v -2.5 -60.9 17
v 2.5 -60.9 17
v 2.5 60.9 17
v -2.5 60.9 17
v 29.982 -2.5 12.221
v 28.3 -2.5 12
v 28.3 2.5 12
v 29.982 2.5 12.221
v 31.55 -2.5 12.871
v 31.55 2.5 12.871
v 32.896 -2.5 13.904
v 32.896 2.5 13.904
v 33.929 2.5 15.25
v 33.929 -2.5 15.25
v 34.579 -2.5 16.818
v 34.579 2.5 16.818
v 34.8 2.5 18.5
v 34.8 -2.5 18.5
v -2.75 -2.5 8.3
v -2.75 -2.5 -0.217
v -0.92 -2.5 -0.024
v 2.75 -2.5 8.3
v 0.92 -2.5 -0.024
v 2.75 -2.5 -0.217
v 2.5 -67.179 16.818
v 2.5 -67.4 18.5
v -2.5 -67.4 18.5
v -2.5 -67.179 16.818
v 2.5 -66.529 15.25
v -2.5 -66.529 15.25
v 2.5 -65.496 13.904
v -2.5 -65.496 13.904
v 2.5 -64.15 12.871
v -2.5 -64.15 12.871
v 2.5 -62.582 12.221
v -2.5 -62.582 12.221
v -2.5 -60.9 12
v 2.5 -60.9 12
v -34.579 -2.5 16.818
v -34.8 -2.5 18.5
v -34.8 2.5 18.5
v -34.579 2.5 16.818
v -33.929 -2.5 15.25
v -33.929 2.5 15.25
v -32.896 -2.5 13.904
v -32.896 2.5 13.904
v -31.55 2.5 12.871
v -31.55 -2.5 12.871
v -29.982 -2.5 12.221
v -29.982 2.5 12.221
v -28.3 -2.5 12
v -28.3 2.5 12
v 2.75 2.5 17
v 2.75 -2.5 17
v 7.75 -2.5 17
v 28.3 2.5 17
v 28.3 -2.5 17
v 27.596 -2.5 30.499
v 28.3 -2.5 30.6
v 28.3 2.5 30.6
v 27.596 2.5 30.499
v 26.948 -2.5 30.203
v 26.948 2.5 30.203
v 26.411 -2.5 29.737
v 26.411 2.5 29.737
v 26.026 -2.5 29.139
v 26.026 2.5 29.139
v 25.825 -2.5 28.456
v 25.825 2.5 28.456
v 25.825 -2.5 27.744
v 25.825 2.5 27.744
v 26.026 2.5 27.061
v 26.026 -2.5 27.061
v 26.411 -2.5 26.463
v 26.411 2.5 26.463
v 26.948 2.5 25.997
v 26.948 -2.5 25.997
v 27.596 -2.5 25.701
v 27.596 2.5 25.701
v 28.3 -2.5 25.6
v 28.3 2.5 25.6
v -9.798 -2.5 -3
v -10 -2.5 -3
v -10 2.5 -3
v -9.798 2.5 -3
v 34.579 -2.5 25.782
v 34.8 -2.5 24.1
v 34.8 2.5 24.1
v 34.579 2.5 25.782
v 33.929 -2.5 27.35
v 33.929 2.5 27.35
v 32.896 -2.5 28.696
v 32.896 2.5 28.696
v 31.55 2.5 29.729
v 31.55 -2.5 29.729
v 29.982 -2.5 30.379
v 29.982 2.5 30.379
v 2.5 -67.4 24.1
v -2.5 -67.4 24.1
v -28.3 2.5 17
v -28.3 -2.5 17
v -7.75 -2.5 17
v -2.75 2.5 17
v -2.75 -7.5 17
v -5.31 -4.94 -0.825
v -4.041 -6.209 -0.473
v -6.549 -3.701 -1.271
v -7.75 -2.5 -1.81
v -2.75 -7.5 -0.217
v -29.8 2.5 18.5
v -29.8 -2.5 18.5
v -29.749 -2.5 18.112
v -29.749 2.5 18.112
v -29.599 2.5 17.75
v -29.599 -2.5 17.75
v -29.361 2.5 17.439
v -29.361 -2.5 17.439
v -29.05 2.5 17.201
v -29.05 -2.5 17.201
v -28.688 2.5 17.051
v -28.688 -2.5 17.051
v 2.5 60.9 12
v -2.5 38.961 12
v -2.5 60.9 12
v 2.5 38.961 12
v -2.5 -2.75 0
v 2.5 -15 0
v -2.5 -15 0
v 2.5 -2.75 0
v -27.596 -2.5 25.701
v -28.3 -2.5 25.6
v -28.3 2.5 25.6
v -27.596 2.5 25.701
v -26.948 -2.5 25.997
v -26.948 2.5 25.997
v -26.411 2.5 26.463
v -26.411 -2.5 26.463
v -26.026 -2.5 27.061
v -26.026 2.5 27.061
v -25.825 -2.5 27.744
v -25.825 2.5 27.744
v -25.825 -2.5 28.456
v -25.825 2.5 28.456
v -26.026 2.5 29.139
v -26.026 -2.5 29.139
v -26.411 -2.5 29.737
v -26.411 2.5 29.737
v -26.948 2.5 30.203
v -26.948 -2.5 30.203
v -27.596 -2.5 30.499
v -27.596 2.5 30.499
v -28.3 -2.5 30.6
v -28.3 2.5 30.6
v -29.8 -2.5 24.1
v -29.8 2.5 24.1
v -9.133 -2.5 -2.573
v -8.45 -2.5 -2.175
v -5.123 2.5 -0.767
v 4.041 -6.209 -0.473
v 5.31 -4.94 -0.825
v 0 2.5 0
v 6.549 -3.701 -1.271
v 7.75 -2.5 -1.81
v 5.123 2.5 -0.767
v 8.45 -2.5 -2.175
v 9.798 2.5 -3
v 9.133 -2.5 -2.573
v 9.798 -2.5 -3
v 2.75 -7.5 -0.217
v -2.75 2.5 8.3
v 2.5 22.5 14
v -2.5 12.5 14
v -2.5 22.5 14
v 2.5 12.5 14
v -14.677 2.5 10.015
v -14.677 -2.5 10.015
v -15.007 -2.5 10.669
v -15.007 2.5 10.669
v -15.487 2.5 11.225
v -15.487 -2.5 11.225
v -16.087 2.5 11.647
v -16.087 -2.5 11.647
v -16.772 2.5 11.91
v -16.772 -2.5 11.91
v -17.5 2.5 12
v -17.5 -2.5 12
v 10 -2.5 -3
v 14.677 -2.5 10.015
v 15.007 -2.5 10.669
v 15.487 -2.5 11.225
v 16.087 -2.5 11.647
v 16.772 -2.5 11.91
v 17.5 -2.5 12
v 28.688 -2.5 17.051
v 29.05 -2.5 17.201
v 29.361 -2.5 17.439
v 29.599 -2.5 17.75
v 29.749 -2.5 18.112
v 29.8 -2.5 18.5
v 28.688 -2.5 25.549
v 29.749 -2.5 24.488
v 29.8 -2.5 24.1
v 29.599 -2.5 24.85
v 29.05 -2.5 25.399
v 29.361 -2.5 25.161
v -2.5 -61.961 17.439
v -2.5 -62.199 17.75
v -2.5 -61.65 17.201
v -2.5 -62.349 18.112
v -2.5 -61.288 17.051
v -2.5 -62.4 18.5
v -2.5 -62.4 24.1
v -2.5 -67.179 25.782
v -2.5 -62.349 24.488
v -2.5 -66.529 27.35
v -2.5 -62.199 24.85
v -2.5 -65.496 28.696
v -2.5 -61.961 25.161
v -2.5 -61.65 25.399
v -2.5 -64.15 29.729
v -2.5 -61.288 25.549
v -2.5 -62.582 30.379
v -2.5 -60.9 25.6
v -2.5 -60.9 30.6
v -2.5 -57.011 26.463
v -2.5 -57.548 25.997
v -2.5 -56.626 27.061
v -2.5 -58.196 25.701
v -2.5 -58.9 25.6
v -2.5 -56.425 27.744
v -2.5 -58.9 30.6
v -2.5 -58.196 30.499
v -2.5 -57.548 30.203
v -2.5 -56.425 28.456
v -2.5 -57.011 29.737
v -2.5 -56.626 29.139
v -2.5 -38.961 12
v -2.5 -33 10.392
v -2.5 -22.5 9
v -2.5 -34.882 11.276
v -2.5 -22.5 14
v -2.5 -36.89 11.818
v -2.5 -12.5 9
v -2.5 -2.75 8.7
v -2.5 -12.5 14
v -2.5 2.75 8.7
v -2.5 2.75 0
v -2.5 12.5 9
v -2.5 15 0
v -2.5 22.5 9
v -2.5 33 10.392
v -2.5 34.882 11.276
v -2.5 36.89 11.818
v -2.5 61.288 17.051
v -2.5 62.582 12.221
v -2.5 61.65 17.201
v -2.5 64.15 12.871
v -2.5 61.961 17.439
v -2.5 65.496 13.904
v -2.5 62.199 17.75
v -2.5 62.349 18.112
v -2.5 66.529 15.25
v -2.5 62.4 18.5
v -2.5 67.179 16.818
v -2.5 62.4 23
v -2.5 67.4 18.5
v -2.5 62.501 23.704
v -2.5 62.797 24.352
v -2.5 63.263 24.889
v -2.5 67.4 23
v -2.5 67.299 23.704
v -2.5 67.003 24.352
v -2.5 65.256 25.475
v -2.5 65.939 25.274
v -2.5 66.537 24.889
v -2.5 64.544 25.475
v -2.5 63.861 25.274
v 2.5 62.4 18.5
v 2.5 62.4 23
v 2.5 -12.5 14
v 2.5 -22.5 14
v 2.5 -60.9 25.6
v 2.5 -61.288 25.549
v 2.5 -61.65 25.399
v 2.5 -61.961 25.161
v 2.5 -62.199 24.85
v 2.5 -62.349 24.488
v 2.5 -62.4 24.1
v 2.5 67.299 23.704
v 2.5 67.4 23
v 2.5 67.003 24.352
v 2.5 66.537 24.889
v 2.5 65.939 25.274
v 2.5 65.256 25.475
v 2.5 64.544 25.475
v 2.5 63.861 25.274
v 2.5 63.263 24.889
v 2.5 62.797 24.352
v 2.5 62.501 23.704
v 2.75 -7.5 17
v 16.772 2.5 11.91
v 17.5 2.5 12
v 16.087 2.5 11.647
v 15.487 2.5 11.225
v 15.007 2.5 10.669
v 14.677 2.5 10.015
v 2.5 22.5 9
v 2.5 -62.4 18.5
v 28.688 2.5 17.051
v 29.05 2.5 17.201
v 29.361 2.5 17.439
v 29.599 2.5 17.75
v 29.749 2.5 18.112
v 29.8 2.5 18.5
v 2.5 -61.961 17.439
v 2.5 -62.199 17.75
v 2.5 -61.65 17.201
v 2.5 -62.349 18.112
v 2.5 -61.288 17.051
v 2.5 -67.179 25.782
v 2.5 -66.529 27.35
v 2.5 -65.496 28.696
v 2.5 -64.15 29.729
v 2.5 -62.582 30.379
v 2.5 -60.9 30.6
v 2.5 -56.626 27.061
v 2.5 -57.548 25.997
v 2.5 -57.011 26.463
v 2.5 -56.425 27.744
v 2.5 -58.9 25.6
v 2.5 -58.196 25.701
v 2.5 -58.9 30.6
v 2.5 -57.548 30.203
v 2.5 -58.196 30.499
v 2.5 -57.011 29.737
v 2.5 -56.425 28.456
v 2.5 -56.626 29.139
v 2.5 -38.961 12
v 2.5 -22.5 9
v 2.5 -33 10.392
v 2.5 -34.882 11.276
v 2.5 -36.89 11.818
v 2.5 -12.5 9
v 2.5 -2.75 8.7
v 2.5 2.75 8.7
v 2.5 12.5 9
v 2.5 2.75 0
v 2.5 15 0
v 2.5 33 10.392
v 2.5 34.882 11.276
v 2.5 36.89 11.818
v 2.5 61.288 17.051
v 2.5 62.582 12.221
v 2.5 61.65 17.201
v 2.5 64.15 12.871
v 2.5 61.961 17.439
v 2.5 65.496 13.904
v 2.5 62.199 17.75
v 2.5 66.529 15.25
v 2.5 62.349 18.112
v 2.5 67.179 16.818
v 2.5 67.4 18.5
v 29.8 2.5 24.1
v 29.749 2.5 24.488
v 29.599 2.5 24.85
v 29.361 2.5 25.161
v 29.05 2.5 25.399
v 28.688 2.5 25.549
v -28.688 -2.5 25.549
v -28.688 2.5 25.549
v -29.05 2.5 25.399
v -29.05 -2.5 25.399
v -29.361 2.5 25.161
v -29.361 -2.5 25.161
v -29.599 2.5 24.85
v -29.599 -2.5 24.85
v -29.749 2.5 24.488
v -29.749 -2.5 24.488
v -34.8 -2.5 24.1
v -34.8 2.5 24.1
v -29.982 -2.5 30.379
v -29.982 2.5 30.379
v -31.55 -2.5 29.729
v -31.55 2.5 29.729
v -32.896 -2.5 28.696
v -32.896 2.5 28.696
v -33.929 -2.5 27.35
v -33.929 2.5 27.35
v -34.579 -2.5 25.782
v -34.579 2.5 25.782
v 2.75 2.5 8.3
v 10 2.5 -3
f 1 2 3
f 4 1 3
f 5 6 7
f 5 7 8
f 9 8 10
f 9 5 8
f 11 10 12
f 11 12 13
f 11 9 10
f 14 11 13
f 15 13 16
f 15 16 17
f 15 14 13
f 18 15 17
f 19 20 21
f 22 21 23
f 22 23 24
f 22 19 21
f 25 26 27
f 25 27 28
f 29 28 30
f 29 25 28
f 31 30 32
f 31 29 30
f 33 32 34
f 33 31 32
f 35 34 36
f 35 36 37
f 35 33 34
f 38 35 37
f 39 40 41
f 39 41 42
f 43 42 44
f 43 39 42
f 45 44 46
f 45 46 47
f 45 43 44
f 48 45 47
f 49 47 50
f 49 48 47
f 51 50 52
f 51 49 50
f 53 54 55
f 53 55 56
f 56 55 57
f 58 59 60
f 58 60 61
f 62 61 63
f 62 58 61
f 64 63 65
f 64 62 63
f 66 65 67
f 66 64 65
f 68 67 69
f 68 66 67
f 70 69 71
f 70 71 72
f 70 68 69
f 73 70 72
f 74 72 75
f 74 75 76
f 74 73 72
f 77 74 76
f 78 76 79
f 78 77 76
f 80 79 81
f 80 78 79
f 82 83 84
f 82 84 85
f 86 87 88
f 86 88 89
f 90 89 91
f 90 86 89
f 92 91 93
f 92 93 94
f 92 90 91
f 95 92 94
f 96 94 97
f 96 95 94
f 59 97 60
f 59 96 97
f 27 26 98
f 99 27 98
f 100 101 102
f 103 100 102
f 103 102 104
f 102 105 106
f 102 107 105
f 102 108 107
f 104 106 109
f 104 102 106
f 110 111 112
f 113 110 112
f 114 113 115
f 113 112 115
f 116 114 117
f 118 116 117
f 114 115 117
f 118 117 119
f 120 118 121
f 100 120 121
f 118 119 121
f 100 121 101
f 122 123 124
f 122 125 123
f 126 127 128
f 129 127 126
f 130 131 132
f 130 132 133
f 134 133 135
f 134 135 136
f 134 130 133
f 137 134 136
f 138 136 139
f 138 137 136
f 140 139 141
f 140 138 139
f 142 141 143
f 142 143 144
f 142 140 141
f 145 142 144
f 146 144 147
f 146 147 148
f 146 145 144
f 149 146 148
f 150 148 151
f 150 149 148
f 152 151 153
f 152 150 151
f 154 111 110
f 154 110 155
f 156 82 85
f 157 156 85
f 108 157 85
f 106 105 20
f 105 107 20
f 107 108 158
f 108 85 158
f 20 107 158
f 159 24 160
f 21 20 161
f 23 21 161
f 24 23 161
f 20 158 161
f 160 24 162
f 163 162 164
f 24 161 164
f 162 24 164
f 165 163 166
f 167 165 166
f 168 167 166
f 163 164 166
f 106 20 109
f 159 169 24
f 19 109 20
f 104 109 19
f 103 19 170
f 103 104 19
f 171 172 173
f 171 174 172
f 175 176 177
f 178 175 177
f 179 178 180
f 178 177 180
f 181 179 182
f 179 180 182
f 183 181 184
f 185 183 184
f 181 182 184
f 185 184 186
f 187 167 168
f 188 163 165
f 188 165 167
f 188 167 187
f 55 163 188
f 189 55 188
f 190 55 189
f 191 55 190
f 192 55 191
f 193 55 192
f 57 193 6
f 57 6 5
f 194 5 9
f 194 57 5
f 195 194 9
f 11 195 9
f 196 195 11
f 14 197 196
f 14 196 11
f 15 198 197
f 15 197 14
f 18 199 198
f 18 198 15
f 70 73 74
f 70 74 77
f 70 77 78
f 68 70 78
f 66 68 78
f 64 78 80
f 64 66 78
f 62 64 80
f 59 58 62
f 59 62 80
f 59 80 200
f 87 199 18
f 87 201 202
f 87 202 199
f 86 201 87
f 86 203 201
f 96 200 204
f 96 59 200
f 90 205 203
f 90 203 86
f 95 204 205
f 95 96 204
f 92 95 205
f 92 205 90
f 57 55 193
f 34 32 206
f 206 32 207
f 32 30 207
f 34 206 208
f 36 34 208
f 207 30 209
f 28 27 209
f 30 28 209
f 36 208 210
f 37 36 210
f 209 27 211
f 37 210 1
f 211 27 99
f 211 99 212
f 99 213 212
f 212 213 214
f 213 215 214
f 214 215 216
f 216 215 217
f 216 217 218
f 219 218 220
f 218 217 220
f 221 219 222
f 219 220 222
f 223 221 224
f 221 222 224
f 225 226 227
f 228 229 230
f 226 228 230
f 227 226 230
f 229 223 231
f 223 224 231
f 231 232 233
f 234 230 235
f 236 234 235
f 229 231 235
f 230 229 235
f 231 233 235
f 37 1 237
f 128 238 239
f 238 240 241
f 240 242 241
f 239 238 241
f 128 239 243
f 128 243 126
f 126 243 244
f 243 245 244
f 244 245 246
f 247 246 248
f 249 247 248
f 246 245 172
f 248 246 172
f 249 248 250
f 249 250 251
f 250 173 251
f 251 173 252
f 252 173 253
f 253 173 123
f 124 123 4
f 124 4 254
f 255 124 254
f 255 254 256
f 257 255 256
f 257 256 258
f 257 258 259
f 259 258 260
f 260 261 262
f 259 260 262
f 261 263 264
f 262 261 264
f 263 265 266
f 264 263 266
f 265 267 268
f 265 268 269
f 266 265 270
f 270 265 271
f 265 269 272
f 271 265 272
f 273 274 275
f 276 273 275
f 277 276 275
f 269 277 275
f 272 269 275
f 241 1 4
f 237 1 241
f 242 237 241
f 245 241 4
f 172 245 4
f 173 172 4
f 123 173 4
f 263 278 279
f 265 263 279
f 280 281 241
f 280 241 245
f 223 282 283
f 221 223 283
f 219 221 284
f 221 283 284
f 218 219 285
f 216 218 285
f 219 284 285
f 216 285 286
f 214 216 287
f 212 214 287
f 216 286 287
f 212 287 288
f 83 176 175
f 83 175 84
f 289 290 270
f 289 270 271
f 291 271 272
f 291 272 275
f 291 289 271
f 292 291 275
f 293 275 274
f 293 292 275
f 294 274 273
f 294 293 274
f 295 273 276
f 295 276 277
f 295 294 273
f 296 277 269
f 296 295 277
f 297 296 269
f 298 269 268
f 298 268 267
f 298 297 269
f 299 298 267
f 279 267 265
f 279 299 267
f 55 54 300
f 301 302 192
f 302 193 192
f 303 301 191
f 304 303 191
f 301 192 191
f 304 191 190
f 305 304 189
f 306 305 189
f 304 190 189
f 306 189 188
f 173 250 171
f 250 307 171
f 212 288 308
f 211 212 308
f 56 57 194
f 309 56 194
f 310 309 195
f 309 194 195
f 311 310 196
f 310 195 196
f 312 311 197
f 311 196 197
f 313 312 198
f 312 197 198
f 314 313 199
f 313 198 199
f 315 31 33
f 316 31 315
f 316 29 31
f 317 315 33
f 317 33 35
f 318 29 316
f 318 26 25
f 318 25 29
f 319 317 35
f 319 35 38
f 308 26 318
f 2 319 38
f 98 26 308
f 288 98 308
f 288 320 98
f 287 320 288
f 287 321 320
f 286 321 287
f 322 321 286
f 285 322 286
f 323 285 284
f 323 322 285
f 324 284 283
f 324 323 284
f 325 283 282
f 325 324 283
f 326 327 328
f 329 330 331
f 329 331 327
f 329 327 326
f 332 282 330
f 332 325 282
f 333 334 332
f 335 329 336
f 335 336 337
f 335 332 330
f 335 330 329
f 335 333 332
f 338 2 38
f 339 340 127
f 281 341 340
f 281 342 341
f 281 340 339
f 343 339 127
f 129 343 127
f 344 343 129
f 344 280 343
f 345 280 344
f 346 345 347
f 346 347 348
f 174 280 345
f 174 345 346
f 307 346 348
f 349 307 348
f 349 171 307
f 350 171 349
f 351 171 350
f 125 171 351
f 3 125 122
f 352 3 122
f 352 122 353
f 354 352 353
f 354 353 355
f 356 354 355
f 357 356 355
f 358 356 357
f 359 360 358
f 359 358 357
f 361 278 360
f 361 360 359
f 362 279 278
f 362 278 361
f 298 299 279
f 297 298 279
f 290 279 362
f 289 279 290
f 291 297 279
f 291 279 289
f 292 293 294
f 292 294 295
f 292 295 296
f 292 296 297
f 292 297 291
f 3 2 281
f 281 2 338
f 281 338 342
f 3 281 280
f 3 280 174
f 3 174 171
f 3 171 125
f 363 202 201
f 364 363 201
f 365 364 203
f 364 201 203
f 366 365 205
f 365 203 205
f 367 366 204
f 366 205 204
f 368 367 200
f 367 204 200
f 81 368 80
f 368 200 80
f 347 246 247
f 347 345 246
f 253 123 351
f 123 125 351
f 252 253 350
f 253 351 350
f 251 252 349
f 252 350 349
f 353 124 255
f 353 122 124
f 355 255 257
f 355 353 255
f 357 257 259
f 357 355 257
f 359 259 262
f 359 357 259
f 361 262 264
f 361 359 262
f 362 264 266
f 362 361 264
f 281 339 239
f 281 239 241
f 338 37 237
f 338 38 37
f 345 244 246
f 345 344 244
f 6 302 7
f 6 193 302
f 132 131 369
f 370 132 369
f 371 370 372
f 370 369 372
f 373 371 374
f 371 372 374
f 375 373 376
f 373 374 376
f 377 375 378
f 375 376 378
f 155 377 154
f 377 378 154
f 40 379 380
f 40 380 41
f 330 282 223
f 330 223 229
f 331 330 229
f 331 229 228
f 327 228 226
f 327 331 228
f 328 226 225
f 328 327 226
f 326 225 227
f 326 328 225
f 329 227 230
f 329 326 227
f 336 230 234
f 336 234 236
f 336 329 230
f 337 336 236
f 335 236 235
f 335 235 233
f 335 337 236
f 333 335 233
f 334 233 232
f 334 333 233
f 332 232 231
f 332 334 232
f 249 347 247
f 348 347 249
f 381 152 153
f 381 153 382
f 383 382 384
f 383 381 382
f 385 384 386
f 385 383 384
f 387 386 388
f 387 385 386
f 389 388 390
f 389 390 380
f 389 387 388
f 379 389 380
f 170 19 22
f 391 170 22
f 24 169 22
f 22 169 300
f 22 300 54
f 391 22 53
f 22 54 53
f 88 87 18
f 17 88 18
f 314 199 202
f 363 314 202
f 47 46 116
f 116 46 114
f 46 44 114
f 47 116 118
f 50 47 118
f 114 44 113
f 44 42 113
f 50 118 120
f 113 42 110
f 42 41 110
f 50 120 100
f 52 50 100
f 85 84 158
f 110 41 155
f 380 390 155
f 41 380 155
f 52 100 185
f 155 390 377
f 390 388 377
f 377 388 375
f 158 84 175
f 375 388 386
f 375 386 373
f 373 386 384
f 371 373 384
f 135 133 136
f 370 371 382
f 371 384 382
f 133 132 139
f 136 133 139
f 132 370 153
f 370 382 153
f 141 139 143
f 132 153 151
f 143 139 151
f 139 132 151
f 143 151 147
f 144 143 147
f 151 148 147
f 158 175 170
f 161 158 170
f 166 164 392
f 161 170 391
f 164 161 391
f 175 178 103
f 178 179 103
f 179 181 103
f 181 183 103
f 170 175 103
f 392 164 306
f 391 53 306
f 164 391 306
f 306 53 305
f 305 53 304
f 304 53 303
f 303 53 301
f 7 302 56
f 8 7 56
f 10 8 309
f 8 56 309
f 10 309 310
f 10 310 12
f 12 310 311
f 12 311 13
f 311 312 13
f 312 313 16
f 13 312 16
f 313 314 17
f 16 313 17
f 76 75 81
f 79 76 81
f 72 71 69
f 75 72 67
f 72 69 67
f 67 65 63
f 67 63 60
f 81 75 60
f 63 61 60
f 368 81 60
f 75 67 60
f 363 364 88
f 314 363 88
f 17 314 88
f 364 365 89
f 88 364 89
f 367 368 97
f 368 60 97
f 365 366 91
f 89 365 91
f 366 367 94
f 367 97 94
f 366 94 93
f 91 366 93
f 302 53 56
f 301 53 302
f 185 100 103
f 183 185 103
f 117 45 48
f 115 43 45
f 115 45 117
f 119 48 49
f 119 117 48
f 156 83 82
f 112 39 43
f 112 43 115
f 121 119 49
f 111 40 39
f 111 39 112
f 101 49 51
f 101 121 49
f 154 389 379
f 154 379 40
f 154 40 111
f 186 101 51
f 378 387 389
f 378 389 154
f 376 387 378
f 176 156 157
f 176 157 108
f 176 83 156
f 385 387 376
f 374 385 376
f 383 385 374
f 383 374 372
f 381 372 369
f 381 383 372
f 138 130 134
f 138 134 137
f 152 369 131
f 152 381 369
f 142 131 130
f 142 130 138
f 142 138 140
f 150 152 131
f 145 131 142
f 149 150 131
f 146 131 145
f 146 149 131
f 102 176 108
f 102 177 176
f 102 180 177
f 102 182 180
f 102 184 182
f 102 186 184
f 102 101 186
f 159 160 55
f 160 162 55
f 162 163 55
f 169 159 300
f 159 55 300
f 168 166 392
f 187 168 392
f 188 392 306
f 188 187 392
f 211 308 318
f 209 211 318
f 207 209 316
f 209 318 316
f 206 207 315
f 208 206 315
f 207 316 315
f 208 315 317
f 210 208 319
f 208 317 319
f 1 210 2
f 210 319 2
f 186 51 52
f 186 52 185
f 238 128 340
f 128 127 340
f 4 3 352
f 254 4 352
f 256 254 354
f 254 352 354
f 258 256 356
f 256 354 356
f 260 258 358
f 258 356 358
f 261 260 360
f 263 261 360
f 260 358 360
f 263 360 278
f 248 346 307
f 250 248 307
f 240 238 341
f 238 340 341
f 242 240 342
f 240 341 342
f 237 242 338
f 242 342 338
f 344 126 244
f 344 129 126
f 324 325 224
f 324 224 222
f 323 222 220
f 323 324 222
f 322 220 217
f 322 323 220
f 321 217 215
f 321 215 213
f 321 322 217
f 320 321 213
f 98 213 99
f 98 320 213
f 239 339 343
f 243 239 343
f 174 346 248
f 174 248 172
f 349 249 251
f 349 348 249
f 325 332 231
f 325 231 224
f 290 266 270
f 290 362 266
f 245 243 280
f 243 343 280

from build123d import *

# Parameters (mm, degrees)
SKETCH_W     = 10
SKETCH_H     = 5
PAD_DEPTH    = 2.5
PAD001_DEPTH = 2.5
PAD002_DEPTH = 20
POCKET_DEPTH = 10


with BuildPart() as vertical:
    # Sketch → Pad (new body, symmetric)
    with BuildSketch(Plane.YZ):
        with BuildLine():
            Line((67.4, 18.500001), (67.4, 22.999999))
            ThreePointArc((67.4, 22.999999), (64.9, 25.499999), (62.4, 23))
            Line((62.4, 18.499999), (62.4, 23))
            ThreePointArc((60.899999, 17), (61.960659, 17.439339), (62.4, 18.499999))
            Line((-60.9, 17), (60.899999, 17))
            ThreePointArc((-62.4, 18.499999), (-61.96066, 17.439339), (-60.9, 17))
            Line((-62.4, 24.100001), (-62.4, 18.499999))
            ThreePointArc((-60.899999, 25.6), (-61.960659, 25.160661), (-62.4, 24.100001))
            Line((-60.899999, 25.6), (-58.899999, 25.6))
            ThreePointArc((-58.899999, 25.6), (-56.399999, 28.1), (-58.899999, 30.6))
            Line((-58.899999, 30.6), (-60.900001, 30.6))
            ThreePointArc((-60.900001, 30.6), (-65.496194, 28.696194), (-67.4, 24.100001))
            Line((-67.4, 18.499999), (-67.4, 24.100001))
            ThreePointArc((-67.4, 18.499999), (-65.496194, 13.903805), (-60.9, 12))
            Line((-60.9, 12), (-38.96081, 12))
            ThreePointArc((-33, 10.392302), (-35.873903, 11.591025), (-38.96081, 12))
            Line((-15, 0), (-33, 10.392302))
            Line((-15, 0), (-2.75, 0))
            Line((-2.75, 0), (-2.75, 8.7))
            Line((-2.75, 8.7), (2.75, 8.7))
            Line((2.75, 8.7), (2.75, 0))
            Line((2.75, 0), (15, 0))
            Line((15, 0), (33, 10.392302))
            ThreePointArc((38.96081, 12), (35.873903, 11.591025), (33, 10.392302))
            Line((38.96081, 12), (60.9, 12))
            ThreePointArc((60.9, 12), (65.496194, 13.903806), (67.4, 18.500001))
        make_face()
        with Locations((-17.5, 11.5)):
            Rectangle(SKETCH_W, SKETCH_H, mode=Mode.SUBTRACT)
        with Locations((17.5, 11.5)):
            Rectangle(SKETCH_W, SKETCH_H, mode=Mode.SUBTRACT)
    extrude(amount=PAD_DEPTH, both=True)


with BuildPart() as fusion:
    # Sketch001 → Pad001 (new body, symmetric)
    with BuildSketch(Plane.XZ):
        with BuildLine():
            Line((17.5, 12.000012), (28.29999, 12))
            ThreePointArc((28.29999, 12), (32.896191, 13.903803), (34.8, 18.500002))
            Line((34.8, 24.100021), (34.8, 18.500002))
            ThreePointArc((34.8, 24.100021), (32.896194, 28.696217), (28.299998, 30.600023))
            ThreePointArc((28.299998, 30.600023), (25.799998, 28.100023), (28.299998, 25.600023))
            ThreePointArc((29.8, 24.100021), (29.36066, 25.160683), (28.299998, 25.600023))
            Line((29.8, 18.500002), (29.8, 24.100021))
            ThreePointArc((28.299998, 17), (29.36066, 17.43934), (29.8, 18.500002))
            Line((2.75, 17), (28.299998, 17))
            Line((2.75, 8.3), (2.75, 17))
            Line((-2.75, 8.3), (2.75, 8.3))
            Line((-2.75, 17.000012), (-2.75, 8.3))
            Line((-28.3, 17.000012), (-2.75, 17.000012))
            ThreePointArc((-29.8, 18.500002), (-29.360657, 17.439349), (-28.3, 17.000012))
            Line((-29.8, 18.500002), (-29.8, 24.100021))
            ThreePointArc((-28.299997, 25.600012), (-29.360656, 25.160676), (-29.8, 24.100021))
            ThreePointArc((-28.299997, 25.600012), (-25.799998, 28.100012), (-28.299998, 30.600012))
            ThreePointArc((-28.299998, 30.600012), (-32.89619, 28.69621), (-34.8, 24.100021))
            Line((-34.8, 24.100021), (-34.8, 18.500002))
            ThreePointArc((-34.8, 18.500002), (-32.89619, 13.903814), (-28.299998, 12.000012))
            Line((-28.299998, 12.000012), (-17.5, 12.000012))
            ThreePointArc((-14.676752, 10.014541), (-15.774252, 11.453947), (-17.5, 12.000012))
            Line((-14.676752, 10.014541), (-10, -3))
            Line((-10, -3), (10, -3))
            Line((10, -3), (14.676749, 10.014541))
            ThreePointArc((17.5, 12.000012), (15.77425, 11.453947), (14.676749, 10.014541))
        make_face()
    extrude(amount=PAD001_DEPTH, both=True)

    # Sketch002 → Pad002 (new body)
    with BuildSketch(Plane(origin=(0, 0, 17.000012), x_dir=(-1, 0, 0), z_dir=(0, 0, 1))):
        Polygon((-7.75, 2.5), (-2.75, 7.5), (-2.75, 2.5), align=None)
        Polygon((2.75, 7.5), (2.75, 2.5), (7.75, 2.5), align=None)
    extrude(amount=-PAD002_DEPTH)

    # Sketch003 → Pocket (cut)
    with BuildSketch(Plane(origin=(0, 2.5, 0), x_dir=(1, 0, 0), z_dir=(0, 1, 0))):
        with BuildLine():
            ThreePointArc((-10, 3.138593), (0, 0), (10, 3.138593))
            Line((-10, 3.138593), (10, 3.138593))
        make_face()
    extrude(amount=-POCKET_DEPTH, mode=Mode.SUBTRACT)

    # Fusion: union Vertical
    add(vertical.part)


solid = fusion.part
